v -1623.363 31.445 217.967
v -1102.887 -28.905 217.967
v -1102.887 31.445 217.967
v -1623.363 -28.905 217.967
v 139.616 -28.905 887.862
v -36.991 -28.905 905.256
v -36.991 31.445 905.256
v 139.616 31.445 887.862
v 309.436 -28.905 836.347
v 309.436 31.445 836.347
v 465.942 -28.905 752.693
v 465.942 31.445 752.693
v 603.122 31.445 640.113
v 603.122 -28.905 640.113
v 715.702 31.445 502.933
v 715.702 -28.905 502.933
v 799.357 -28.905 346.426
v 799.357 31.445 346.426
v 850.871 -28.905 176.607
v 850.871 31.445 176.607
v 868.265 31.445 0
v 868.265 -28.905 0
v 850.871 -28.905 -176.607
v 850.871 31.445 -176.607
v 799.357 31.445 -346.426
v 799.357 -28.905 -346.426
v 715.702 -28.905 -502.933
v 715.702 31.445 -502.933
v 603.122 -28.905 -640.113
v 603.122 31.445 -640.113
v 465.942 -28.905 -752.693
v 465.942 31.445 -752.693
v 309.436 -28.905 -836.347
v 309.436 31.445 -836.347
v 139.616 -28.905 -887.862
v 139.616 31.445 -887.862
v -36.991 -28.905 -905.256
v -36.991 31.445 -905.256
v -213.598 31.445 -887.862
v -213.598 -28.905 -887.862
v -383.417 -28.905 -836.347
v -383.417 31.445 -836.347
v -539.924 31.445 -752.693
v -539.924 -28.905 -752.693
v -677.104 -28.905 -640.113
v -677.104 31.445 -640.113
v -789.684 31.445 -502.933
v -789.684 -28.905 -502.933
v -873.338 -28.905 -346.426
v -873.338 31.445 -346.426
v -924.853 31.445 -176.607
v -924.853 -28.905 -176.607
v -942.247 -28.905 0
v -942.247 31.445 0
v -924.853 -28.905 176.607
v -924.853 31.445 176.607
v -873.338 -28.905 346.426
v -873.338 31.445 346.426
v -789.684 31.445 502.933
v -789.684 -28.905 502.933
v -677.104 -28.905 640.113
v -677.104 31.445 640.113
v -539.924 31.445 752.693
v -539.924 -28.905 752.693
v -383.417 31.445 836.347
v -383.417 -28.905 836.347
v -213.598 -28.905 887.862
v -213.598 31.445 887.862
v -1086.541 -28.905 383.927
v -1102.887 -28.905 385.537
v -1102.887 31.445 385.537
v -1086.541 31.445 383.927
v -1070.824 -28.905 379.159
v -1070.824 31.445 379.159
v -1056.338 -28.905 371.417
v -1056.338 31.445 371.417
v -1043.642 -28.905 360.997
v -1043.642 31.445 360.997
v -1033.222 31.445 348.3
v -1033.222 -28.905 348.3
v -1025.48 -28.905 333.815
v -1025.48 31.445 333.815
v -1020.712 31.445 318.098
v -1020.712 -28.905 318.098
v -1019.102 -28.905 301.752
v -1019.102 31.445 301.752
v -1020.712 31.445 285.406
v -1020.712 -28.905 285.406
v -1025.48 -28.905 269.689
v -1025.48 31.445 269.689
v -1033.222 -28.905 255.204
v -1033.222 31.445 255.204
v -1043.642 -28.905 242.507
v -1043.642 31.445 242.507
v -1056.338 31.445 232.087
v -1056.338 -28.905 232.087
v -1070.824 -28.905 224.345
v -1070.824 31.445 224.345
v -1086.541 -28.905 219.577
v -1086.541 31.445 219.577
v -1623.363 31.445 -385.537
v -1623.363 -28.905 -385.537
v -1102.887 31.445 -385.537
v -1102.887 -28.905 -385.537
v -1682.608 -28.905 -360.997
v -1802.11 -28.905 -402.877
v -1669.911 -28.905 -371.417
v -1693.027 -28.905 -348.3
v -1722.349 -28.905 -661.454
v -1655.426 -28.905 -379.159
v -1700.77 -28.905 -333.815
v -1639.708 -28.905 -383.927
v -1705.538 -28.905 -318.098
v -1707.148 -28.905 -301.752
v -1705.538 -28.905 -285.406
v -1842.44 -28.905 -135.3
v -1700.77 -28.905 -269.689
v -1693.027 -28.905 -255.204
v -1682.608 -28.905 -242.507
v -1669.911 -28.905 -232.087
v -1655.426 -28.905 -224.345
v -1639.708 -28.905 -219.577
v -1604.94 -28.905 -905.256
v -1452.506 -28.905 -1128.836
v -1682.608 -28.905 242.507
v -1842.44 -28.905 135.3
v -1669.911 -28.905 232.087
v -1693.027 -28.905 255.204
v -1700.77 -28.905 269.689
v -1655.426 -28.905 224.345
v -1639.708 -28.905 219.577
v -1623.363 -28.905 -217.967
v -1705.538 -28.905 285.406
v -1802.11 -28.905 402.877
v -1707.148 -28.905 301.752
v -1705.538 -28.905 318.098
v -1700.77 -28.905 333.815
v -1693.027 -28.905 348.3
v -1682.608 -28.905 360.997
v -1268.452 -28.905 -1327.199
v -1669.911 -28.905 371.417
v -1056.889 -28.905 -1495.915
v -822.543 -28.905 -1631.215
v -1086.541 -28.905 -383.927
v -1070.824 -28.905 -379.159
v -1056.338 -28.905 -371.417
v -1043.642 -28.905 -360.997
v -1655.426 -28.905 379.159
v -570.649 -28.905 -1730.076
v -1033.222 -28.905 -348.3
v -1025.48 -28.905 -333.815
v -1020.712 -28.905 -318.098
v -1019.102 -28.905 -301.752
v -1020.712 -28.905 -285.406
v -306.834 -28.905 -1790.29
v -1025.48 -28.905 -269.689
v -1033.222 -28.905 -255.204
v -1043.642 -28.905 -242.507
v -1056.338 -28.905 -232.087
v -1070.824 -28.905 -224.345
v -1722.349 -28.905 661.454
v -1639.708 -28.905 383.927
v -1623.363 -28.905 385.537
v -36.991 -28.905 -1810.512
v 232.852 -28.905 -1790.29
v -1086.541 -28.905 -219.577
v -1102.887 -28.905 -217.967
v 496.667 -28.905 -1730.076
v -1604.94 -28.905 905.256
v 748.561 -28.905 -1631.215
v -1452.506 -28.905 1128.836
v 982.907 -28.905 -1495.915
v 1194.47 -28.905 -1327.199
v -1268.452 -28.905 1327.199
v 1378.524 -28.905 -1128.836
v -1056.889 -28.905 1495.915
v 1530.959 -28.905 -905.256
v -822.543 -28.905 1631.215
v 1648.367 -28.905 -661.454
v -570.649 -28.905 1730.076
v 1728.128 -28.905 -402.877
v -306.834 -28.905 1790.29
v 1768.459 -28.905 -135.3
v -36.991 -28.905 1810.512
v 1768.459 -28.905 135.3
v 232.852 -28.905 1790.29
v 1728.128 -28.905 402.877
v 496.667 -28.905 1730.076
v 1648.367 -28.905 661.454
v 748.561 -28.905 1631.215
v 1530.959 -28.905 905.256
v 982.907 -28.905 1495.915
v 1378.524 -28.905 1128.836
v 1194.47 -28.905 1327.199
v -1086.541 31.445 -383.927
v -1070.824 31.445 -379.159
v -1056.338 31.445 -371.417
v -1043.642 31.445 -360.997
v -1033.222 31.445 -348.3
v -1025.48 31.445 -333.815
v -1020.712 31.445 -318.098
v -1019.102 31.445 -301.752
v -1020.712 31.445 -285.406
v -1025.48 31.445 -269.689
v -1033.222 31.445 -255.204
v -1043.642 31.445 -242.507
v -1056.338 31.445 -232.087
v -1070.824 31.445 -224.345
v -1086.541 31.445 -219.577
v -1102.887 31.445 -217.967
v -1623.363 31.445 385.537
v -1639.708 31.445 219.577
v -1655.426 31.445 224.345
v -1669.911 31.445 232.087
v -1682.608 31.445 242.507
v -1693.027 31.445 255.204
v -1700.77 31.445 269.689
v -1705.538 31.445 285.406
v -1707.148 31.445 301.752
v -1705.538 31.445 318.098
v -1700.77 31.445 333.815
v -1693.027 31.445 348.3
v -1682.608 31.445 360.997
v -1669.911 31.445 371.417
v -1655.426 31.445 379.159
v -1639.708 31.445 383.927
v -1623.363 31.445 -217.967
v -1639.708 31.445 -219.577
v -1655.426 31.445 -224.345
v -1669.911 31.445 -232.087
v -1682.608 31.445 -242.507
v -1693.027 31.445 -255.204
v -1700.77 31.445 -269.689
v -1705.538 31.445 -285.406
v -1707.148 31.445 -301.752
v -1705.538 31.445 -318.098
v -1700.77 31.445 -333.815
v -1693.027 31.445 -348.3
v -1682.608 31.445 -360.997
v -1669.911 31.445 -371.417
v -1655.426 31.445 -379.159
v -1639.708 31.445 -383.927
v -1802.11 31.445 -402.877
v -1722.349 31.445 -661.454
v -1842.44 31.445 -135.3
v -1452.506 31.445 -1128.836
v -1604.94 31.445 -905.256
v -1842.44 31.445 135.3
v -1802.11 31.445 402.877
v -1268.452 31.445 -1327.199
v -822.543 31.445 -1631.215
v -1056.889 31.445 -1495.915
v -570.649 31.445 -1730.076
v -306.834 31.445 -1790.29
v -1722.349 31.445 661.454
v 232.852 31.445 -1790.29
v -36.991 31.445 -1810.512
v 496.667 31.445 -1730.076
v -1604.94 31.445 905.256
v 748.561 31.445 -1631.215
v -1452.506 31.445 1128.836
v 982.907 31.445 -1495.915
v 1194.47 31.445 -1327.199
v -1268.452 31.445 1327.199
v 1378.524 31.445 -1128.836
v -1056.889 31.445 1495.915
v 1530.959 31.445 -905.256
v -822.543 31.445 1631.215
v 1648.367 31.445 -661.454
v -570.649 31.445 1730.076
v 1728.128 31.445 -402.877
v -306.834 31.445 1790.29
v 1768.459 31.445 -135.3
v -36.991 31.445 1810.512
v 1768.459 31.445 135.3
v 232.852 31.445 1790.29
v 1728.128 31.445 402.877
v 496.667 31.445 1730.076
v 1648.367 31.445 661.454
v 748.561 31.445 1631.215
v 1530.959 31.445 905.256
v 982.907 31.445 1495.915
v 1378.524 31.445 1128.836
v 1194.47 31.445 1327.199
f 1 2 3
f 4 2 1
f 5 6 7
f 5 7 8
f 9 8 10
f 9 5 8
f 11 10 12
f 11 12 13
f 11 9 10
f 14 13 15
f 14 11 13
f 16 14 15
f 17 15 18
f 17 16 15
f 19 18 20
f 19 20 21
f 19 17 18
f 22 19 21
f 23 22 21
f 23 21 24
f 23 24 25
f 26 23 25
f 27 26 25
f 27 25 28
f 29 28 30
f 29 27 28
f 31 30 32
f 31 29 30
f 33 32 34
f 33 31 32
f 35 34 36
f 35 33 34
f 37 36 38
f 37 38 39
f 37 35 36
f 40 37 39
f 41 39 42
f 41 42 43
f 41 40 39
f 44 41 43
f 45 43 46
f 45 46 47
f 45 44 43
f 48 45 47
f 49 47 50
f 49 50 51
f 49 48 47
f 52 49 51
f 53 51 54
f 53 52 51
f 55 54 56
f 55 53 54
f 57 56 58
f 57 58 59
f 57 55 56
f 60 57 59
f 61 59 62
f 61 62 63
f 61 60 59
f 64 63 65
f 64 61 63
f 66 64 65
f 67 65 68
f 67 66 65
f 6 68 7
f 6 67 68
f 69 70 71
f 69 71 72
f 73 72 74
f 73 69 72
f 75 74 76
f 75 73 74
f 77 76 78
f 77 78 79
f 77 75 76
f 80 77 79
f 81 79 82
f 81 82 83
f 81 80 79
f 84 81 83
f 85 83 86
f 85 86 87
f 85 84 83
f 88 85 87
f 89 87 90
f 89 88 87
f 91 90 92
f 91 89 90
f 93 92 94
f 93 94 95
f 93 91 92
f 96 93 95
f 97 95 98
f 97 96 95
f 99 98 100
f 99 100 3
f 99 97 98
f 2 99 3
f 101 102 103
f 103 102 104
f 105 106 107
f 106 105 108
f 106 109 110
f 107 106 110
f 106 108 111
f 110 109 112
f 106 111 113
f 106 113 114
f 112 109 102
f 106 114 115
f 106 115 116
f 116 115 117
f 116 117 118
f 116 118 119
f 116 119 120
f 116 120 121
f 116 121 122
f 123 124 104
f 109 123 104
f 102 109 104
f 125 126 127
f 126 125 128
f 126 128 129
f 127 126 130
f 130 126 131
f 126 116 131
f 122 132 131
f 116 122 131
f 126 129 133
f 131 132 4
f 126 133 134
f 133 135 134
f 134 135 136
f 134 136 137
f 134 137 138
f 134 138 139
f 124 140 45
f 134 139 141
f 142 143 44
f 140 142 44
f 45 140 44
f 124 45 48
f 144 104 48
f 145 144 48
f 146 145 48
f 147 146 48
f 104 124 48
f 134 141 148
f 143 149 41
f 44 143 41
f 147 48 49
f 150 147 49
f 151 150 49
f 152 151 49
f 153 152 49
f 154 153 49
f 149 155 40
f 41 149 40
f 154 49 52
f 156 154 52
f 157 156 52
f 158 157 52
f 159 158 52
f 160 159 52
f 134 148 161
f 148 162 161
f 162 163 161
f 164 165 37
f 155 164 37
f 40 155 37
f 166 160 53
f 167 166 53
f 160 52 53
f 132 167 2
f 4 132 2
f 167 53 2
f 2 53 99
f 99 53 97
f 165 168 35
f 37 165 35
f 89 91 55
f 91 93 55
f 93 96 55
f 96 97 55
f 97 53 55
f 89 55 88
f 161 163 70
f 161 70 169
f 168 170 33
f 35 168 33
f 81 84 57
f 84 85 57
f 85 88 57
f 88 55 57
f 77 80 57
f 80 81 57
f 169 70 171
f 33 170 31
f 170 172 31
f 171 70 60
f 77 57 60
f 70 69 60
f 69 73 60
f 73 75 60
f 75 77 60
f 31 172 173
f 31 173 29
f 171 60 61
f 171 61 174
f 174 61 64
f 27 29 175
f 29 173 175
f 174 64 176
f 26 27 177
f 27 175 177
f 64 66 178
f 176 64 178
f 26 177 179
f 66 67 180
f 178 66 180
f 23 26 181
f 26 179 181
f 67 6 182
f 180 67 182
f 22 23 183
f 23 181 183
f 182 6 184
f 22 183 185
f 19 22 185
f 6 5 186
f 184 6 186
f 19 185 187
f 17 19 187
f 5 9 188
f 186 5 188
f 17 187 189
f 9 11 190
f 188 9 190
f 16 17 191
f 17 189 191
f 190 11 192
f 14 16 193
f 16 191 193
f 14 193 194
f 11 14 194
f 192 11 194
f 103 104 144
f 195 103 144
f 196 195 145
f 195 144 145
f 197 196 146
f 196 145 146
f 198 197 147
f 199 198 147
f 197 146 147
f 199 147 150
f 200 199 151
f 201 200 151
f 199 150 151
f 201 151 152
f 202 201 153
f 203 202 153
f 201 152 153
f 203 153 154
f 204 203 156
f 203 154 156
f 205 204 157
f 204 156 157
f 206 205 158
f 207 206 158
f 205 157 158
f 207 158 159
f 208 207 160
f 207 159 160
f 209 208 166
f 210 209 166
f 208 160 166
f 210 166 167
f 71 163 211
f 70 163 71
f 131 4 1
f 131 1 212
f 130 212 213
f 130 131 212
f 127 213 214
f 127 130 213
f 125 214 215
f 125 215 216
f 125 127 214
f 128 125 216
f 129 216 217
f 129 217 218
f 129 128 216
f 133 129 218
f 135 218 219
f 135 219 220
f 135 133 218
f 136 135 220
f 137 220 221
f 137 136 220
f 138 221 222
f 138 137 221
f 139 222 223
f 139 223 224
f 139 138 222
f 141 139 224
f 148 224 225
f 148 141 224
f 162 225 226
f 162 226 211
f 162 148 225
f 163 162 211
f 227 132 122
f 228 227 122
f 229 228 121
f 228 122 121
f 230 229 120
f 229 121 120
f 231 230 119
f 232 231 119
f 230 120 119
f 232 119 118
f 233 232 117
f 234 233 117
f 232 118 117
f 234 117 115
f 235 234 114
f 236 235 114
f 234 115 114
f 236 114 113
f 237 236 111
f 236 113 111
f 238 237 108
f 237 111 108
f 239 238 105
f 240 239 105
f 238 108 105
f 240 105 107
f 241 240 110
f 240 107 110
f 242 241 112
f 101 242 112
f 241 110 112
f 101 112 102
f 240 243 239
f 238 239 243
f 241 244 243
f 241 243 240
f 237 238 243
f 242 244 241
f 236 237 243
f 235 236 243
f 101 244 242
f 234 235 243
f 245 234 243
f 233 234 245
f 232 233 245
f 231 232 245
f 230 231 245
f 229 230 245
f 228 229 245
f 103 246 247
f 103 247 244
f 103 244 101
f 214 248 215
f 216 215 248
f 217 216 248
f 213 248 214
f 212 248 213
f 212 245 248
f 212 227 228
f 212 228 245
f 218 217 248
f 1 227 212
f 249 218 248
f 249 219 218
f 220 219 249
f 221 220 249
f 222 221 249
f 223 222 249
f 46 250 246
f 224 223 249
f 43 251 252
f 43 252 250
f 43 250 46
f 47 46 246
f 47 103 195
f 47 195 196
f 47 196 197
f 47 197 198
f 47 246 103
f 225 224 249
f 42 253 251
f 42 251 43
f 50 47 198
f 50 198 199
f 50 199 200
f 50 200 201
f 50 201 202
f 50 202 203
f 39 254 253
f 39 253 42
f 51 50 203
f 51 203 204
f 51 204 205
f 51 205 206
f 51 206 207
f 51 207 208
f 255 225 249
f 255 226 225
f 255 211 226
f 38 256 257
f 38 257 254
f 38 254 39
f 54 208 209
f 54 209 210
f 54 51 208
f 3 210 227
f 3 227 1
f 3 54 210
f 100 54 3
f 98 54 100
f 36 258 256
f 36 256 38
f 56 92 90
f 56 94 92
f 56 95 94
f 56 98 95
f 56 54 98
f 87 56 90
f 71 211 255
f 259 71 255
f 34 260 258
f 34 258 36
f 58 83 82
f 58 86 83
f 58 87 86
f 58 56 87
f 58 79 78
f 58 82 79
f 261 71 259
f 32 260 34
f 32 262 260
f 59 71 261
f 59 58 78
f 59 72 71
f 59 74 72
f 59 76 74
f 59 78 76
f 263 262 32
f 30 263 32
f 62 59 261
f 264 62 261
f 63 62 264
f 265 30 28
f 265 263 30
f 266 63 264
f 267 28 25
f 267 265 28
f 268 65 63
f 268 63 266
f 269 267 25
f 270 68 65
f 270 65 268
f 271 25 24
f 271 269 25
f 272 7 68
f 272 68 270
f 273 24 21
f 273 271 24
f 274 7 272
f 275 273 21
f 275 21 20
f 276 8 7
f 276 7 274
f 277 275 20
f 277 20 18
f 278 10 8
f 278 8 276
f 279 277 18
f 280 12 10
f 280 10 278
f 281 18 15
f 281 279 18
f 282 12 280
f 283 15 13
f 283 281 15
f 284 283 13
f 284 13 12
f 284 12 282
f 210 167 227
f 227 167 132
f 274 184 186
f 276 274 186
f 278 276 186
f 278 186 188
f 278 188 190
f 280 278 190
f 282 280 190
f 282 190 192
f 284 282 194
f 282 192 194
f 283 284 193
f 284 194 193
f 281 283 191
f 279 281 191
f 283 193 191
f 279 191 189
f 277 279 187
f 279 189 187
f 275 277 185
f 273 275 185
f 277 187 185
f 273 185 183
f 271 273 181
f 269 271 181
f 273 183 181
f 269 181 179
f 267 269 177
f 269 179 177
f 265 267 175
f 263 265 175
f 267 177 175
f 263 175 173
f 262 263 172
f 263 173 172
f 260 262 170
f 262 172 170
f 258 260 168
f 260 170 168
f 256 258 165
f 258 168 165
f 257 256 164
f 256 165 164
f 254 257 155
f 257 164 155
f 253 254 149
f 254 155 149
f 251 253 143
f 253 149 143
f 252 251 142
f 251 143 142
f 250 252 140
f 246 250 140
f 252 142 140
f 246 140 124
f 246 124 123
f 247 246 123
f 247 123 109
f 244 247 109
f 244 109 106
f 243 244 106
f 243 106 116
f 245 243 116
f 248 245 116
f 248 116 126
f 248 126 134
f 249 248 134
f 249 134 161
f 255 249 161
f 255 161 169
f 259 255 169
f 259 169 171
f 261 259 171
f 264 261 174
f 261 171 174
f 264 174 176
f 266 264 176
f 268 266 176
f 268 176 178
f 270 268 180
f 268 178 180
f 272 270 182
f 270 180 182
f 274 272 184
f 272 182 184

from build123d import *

# Parameters (mm, degrees)
SKETCH1_R           = 76.2
SKETCH1_R_2         = 38.1
BOSS_EXTRUDE1_DEPTH = 2.54
SCALE1_SCALE        = 3
SCALE2_SCALE        = 3
SCALE3_SCALE        = 3
SCALE4_SCALE        = 0.88


with BuildPart() as part:
    # Sketch1 → Boss-Extrude1 (new body)
    with BuildSketch(Plane(origin=(0, 0, 0), x_dir=(1, 0, 0), z_dir=(0, 1, 0))):
        with Locations(Location((0, 0, 0), (0, 0, 270))):
            Circle(SKETCH1_R)
        with Locations(Location((0, 0, 0), (0, 0, 270))):
            Circle(SKETCH1_R_2, mode=Mode.SUBTRACT)
        with BuildLine():
            Line((-66.766496625, 16.226296333), (-44.86093692, 16.226296333))
            ThreePointArc((-44.86093692, 16.226296333), (-41.334640587, 12.7), (-44.86093692, 9.173703667))
            Line((-44.86093692, 9.173703667), (-66.766496625, 9.173703667))
            ThreePointArc((-66.766496625, 9.173703667), (-70.292792958, 12.7), (-66.766496625, 16.226296333))
        make_face(mode=Mode.SUBTRACT)
        with BuildLine():
            Line((-66.766496625, -16.226296333), (-44.86093692, -16.226296333))
            ThreePointArc((-44.86093692, -16.226296333), (-41.334640587, -12.7), (-44.86093692, -9.173703667))
            Line((-44.86093692, -9.173703667), (-66.766496625, -9.173703667))
            ThreePointArc((-66.766496625, -9.173703667), (-70.292792958, -12.7), (-66.766496625, -16.226296333))
        make_face(mode=Mode.SUBTRACT)
    extrude(amount=BOSS_EXTRUDE1_DEPTH)


with BuildPart() as part_1:
    # Scale1: scaled about (1.625257345, 1.27, 0)
    add(part.part.scale(SCALE1_SCALE).moved(Location((-3.25051469, -2.54, 0))))


with BuildPart() as part_2:
    # Scale2: scaled about (1.625257344, 1.27, 0)
    add(part_1.part.scale(SCALE2_SCALE).moved(Location((-3.250514688, -2.54, 0))))


with BuildPart() as part_3:
    # Scale3: scaled about (1.625257343, 1.27, 0)
    add(part_2.part.scale(SCALE3_SCALE).moved(Location((-3.250514686, -2.54, 0))))


with BuildPart() as part_4:
    # Scale4: scaled about (1.625257342, 1.27, 0)
    add(part_3.part.scale(SCALE4_SCALE).moved(Location((0.195030881, 0.1524, 0))))


solid = part_4.part
